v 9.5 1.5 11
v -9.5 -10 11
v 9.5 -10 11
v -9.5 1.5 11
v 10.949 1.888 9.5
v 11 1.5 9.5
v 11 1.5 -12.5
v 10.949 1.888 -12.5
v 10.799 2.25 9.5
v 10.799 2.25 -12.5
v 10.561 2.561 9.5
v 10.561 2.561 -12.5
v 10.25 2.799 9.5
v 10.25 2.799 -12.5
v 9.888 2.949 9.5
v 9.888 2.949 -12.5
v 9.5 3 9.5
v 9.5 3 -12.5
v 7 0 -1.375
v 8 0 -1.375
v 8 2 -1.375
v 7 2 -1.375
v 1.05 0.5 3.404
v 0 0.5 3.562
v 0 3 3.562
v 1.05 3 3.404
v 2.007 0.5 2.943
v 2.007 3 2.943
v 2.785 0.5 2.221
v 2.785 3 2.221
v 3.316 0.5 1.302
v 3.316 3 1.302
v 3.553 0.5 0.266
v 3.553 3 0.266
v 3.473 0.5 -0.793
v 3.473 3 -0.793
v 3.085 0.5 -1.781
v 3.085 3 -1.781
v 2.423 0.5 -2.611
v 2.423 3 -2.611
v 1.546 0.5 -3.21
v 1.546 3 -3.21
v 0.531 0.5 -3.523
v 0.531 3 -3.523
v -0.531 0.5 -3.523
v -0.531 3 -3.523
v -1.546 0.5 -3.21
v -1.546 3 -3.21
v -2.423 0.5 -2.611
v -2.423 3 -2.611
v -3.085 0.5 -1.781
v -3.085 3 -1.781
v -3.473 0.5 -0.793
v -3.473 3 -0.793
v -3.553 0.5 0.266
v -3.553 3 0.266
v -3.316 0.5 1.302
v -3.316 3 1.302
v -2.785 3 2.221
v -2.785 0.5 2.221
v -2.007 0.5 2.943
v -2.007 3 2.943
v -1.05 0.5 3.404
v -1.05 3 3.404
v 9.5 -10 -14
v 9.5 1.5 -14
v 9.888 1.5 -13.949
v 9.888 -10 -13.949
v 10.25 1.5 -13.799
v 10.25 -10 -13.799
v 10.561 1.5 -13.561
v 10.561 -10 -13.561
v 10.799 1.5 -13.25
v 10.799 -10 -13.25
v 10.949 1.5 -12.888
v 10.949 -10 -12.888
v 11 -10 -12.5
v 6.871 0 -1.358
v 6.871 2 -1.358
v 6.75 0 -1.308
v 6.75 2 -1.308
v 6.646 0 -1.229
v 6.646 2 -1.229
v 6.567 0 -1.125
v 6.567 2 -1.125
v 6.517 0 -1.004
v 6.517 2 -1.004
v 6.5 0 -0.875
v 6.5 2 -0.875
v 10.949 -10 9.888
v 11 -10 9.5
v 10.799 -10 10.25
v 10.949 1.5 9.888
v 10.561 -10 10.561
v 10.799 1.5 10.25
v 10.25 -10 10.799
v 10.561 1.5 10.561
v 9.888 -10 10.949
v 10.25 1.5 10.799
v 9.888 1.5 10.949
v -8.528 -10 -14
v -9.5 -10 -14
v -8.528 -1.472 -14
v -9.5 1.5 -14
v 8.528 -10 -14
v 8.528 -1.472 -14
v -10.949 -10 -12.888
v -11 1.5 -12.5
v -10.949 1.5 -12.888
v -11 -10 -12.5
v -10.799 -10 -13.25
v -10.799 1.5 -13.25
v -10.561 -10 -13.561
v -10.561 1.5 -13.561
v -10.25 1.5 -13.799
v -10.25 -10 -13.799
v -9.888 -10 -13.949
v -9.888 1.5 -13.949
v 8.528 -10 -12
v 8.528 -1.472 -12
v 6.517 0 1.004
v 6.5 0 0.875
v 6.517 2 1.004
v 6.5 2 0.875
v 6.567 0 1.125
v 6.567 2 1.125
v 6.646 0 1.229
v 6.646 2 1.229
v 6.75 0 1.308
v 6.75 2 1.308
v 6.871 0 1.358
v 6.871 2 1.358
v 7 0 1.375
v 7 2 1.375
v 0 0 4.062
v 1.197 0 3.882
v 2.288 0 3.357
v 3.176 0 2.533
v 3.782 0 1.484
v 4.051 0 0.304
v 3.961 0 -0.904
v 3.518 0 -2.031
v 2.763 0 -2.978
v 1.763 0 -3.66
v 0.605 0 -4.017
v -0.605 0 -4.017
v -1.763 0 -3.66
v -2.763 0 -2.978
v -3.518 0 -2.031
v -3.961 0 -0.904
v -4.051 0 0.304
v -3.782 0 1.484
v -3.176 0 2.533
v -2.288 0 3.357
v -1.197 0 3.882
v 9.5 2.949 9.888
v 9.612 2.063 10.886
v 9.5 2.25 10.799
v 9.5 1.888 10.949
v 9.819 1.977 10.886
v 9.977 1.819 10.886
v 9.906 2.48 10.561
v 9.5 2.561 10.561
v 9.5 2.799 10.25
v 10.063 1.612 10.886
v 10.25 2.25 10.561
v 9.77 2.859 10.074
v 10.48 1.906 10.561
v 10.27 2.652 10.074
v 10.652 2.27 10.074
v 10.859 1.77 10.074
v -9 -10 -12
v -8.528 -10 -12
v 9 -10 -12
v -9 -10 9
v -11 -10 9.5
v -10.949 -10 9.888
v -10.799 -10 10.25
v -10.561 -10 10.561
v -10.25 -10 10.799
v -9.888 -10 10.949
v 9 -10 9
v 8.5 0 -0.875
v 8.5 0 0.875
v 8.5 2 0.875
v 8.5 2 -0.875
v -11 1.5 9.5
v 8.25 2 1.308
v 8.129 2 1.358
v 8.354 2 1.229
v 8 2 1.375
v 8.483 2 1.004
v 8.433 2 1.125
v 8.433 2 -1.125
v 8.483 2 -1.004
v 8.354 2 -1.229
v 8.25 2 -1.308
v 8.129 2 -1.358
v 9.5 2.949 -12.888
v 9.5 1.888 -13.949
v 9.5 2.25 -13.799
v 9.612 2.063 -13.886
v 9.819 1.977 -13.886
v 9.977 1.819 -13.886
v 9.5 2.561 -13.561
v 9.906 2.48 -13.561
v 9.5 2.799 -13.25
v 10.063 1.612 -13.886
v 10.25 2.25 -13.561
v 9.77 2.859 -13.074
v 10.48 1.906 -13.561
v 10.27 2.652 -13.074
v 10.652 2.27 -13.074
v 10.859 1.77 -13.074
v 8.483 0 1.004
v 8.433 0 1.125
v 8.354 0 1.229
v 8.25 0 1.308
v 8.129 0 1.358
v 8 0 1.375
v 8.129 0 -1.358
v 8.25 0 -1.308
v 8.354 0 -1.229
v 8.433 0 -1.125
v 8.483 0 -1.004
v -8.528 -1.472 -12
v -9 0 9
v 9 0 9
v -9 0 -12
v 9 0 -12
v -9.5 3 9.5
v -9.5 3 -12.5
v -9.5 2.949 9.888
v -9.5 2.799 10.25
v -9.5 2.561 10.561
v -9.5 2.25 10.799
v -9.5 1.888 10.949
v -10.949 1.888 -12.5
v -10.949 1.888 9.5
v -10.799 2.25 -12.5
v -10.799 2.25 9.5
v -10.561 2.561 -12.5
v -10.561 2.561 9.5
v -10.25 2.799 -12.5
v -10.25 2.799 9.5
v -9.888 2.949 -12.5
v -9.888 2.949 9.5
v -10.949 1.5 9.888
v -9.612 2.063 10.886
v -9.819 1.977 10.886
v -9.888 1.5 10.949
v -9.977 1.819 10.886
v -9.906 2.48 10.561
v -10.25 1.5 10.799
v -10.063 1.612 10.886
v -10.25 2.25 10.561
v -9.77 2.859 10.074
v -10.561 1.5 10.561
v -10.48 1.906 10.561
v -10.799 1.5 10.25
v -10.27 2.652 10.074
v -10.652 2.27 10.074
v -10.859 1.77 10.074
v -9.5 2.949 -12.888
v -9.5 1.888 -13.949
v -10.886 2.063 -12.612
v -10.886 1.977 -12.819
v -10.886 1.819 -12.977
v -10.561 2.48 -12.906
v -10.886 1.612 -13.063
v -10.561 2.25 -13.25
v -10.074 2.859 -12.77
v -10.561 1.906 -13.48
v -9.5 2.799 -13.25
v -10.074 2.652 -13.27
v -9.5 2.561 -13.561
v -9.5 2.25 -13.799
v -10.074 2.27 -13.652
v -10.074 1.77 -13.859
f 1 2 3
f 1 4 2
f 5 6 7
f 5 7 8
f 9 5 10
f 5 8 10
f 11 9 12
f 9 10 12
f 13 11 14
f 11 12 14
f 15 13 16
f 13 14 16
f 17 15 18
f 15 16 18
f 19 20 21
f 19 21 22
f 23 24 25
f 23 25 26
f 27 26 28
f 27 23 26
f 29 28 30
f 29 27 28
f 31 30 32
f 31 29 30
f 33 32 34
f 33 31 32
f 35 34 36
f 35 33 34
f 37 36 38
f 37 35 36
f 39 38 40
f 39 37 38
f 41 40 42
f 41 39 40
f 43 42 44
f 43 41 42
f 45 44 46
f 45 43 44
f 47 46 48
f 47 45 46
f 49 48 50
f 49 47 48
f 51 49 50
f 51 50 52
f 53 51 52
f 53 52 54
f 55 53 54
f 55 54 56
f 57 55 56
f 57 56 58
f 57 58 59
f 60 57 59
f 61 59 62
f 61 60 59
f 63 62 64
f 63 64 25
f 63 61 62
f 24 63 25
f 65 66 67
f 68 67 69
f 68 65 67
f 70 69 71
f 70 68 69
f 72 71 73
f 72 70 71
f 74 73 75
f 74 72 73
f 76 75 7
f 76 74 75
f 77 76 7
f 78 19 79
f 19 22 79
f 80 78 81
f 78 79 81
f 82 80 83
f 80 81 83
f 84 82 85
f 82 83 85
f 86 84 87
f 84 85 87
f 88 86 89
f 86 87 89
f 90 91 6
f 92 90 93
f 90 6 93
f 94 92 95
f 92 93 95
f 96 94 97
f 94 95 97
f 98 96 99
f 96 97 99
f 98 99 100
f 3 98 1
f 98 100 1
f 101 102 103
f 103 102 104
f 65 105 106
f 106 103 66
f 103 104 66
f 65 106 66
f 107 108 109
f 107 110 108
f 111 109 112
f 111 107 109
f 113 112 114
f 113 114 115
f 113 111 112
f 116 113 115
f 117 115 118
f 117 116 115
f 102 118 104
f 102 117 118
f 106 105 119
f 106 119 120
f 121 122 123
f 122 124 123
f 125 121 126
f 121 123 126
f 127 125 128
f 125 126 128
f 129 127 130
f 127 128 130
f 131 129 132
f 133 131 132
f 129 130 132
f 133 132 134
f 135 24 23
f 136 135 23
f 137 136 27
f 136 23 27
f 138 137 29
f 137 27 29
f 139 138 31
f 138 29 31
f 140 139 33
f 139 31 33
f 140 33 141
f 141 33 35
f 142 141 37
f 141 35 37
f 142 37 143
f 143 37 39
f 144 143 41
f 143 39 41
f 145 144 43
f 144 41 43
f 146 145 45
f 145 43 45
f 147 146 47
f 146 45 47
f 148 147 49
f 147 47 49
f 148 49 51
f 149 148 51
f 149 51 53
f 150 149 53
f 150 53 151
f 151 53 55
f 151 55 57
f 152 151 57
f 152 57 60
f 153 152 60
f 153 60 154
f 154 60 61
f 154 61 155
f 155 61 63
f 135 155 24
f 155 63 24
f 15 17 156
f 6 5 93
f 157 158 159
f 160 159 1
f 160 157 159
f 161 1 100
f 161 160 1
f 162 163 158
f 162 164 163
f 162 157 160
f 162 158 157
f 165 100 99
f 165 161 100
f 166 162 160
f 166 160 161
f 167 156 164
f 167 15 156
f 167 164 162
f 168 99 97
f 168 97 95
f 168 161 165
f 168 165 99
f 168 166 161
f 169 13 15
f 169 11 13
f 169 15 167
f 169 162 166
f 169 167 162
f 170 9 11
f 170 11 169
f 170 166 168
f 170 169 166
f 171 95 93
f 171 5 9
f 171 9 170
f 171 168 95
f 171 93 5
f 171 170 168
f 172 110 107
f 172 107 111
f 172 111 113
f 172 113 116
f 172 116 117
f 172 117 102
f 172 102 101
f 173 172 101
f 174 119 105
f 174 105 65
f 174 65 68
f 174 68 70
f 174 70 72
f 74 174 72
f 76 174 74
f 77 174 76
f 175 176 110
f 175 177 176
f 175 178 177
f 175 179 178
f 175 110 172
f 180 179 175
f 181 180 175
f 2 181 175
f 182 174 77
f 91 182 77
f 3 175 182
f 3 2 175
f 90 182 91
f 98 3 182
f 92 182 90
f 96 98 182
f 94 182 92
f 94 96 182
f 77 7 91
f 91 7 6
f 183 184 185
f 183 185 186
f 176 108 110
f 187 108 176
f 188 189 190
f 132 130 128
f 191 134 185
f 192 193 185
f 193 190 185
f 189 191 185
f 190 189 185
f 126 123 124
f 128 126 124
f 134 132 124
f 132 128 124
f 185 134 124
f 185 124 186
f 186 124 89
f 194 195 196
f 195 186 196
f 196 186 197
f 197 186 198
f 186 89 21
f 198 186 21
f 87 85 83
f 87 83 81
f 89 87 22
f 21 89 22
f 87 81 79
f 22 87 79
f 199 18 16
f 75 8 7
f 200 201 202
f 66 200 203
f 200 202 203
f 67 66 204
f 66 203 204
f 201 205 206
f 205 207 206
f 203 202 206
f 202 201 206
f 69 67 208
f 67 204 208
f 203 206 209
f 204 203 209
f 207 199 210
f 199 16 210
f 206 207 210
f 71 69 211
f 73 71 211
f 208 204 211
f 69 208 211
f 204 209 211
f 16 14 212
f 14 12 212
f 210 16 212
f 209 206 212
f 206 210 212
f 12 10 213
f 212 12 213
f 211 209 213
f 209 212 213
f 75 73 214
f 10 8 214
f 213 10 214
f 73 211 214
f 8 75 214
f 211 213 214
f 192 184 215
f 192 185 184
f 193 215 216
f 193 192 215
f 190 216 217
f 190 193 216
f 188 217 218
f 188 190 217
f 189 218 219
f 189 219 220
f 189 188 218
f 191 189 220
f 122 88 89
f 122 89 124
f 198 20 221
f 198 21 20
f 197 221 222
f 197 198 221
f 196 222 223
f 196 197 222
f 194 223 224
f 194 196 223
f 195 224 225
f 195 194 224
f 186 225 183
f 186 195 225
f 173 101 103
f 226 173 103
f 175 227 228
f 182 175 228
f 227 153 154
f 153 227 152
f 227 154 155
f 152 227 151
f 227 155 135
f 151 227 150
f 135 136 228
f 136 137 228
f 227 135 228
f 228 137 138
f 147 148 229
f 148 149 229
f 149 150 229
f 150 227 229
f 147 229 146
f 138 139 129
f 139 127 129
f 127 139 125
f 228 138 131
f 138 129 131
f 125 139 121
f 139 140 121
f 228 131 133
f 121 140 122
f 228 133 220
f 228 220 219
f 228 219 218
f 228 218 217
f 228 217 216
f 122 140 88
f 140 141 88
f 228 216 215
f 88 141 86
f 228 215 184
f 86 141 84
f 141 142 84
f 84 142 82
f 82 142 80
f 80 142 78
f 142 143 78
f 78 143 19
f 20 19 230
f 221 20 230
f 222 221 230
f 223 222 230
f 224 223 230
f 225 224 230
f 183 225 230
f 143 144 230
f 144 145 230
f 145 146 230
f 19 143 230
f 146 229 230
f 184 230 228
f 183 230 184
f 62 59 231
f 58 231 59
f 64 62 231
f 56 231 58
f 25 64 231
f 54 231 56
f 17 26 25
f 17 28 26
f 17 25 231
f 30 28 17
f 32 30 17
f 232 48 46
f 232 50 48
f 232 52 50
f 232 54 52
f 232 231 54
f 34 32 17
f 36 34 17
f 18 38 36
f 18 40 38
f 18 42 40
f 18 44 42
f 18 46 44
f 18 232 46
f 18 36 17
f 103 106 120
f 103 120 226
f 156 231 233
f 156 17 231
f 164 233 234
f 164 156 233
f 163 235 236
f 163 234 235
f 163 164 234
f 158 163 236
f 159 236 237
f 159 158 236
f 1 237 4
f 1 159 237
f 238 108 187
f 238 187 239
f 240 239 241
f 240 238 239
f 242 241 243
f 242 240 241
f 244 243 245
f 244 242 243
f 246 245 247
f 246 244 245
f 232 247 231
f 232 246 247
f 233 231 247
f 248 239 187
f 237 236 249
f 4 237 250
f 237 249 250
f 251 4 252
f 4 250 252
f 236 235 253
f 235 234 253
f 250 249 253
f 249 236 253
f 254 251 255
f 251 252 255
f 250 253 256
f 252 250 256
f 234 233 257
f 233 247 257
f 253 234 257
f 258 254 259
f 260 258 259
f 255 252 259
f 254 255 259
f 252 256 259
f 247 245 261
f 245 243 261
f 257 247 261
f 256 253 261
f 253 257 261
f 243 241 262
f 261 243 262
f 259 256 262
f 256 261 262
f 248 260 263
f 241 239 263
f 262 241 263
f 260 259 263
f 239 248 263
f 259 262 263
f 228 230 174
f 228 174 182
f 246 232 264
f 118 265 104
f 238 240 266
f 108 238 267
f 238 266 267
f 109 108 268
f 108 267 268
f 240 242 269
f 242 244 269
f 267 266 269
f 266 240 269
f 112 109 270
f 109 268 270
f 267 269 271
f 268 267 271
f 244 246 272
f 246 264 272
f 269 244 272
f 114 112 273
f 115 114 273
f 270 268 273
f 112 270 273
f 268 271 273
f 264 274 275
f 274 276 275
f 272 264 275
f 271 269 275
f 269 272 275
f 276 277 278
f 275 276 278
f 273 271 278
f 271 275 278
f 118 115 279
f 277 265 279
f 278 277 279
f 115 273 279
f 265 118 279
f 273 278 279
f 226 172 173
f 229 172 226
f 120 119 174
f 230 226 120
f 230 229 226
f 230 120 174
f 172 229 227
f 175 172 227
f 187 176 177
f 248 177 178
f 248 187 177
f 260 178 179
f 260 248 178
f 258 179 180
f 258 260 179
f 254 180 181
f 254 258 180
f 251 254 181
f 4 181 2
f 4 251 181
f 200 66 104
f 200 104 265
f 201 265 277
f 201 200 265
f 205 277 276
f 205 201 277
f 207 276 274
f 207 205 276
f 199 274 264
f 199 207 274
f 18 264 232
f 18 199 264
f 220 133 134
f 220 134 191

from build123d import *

# Parameters (mm, degrees)
SKETCH1_W           = 22
SKETCH1_H           = 25
SKETCH1_R           = 3.5625
BOSS_EXTRUDE1_DEPTH = 3
CUT_EXTRUDE1_DEPTH  = 2
SKETCH2_W           = 22
SKETCH2_H           = 25
SKETCH2_W_2         = 18
SKETCH2_H_2         = 21
BOSS_EXTRUDE2_DEPTH = 10
FILLET1_R           = 1.5
CHAMFER2_SIZE       = 0.5
FILLET2_R           = 0.5
SKETCH6_W           = 17.056767778
SKETCH6_H           = 17.056767778
CUT_EXTRUDE4_DEPTH  = 3


with BuildPart() as part:
    # Sketch1 → Boss-Extrude1 (new body)
    with BuildSketch(Plane(origin=(0, 0, 0), x_dir=(1, 0, 0), z_dir=(0, 1, 0))):
        with Locations((0, 1.5)):
            Rectangle(SKETCH1_W, SKETCH1_H)
        with Locations(Location((0, 0, 0), (0, 0, 270))):
            Circle(SKETCH1_R, mode=Mode.SUBTRACT)
    extrude(amount=BOSS_EXTRUDE1_DEPTH)

    # 3DSketch1 → Cut-Extrude1 (cut)
    with BuildSketch(Plane(origin=(8.5, 0, -1.375), x_dir=(-0.5881716976750463, 0, 0.8087360843031886), z_dir=(0, -1, 0))):
        Polygon((0, 0), (1.176343395, 1.617472169), (3.400367627, 0), (2.224024232, -1.617472169), align=None)
    extrude(amount=-CUT_EXTRUDE1_DEPTH, mode=Mode.SUBTRACT)

    # Sketch2 → Boss-Extrude2 (add)
    with BuildSketch(Plane.XZ):
        with Locations((0, -1.5)):
            Rectangle(SKETCH2_W, SKETCH2_H)
        with Locations((0, -1.5)):
            Rectangle(SKETCH2_W_2, SKETCH2_H_2, mode=Mode.SUBTRACT)
    extrude(amount=BOSS_EXTRUDE2_DEPTH)

    # Fillet1
    fillet1_edges = [part.edges().sort_by_distance(p)[0] for p in [
        (11, 3, -1.5),
        (0, 3, -14),
        (-11, 3, -1.5),
        (0, 3, 11),
        (-11, -3.5, -14),
        (11, -3.5, -14),
        (11, -3.5, 11),
        (-11, -3.5, 11),
    ]]
    fillet(fillet1_edges, radius=FILLET1_R)

    # Chamfer2
    chamfer2_edges = [part.edges().sort_by_distance(p)[0] for p in [
        (0, 0, -3.5625),
    ]]
    chamfer(chamfer2_edges, length=CHAMFER2_SIZE)

    # Fillet2
    fillet2_edges = [part.edges().sort_by_distance(p)[0] for p in [
        (8.5, 1, -1.375),
        (8.5, 1, 1.375),
        (6.5, 1, 1.375),
        (6.5, 1, -1.375),
    ]]
    fillet(fillet2_edges, radius=FILLET2_R)

    # Sketch6 → Cut-Extrude4 (cut)
    with BuildSketch(Plane(origin=(0, 0, -14), x_dir=(-1, 0, 0), z_dir=(0, 0, -1))):
        with Locations((0, -10)):
            Rectangle(SKETCH6_W, SKETCH6_H)
    extrude(amount=-CUT_EXTRUDE4_DEPTH, mode=Mode.SUBTRACT)


solid = part.part
